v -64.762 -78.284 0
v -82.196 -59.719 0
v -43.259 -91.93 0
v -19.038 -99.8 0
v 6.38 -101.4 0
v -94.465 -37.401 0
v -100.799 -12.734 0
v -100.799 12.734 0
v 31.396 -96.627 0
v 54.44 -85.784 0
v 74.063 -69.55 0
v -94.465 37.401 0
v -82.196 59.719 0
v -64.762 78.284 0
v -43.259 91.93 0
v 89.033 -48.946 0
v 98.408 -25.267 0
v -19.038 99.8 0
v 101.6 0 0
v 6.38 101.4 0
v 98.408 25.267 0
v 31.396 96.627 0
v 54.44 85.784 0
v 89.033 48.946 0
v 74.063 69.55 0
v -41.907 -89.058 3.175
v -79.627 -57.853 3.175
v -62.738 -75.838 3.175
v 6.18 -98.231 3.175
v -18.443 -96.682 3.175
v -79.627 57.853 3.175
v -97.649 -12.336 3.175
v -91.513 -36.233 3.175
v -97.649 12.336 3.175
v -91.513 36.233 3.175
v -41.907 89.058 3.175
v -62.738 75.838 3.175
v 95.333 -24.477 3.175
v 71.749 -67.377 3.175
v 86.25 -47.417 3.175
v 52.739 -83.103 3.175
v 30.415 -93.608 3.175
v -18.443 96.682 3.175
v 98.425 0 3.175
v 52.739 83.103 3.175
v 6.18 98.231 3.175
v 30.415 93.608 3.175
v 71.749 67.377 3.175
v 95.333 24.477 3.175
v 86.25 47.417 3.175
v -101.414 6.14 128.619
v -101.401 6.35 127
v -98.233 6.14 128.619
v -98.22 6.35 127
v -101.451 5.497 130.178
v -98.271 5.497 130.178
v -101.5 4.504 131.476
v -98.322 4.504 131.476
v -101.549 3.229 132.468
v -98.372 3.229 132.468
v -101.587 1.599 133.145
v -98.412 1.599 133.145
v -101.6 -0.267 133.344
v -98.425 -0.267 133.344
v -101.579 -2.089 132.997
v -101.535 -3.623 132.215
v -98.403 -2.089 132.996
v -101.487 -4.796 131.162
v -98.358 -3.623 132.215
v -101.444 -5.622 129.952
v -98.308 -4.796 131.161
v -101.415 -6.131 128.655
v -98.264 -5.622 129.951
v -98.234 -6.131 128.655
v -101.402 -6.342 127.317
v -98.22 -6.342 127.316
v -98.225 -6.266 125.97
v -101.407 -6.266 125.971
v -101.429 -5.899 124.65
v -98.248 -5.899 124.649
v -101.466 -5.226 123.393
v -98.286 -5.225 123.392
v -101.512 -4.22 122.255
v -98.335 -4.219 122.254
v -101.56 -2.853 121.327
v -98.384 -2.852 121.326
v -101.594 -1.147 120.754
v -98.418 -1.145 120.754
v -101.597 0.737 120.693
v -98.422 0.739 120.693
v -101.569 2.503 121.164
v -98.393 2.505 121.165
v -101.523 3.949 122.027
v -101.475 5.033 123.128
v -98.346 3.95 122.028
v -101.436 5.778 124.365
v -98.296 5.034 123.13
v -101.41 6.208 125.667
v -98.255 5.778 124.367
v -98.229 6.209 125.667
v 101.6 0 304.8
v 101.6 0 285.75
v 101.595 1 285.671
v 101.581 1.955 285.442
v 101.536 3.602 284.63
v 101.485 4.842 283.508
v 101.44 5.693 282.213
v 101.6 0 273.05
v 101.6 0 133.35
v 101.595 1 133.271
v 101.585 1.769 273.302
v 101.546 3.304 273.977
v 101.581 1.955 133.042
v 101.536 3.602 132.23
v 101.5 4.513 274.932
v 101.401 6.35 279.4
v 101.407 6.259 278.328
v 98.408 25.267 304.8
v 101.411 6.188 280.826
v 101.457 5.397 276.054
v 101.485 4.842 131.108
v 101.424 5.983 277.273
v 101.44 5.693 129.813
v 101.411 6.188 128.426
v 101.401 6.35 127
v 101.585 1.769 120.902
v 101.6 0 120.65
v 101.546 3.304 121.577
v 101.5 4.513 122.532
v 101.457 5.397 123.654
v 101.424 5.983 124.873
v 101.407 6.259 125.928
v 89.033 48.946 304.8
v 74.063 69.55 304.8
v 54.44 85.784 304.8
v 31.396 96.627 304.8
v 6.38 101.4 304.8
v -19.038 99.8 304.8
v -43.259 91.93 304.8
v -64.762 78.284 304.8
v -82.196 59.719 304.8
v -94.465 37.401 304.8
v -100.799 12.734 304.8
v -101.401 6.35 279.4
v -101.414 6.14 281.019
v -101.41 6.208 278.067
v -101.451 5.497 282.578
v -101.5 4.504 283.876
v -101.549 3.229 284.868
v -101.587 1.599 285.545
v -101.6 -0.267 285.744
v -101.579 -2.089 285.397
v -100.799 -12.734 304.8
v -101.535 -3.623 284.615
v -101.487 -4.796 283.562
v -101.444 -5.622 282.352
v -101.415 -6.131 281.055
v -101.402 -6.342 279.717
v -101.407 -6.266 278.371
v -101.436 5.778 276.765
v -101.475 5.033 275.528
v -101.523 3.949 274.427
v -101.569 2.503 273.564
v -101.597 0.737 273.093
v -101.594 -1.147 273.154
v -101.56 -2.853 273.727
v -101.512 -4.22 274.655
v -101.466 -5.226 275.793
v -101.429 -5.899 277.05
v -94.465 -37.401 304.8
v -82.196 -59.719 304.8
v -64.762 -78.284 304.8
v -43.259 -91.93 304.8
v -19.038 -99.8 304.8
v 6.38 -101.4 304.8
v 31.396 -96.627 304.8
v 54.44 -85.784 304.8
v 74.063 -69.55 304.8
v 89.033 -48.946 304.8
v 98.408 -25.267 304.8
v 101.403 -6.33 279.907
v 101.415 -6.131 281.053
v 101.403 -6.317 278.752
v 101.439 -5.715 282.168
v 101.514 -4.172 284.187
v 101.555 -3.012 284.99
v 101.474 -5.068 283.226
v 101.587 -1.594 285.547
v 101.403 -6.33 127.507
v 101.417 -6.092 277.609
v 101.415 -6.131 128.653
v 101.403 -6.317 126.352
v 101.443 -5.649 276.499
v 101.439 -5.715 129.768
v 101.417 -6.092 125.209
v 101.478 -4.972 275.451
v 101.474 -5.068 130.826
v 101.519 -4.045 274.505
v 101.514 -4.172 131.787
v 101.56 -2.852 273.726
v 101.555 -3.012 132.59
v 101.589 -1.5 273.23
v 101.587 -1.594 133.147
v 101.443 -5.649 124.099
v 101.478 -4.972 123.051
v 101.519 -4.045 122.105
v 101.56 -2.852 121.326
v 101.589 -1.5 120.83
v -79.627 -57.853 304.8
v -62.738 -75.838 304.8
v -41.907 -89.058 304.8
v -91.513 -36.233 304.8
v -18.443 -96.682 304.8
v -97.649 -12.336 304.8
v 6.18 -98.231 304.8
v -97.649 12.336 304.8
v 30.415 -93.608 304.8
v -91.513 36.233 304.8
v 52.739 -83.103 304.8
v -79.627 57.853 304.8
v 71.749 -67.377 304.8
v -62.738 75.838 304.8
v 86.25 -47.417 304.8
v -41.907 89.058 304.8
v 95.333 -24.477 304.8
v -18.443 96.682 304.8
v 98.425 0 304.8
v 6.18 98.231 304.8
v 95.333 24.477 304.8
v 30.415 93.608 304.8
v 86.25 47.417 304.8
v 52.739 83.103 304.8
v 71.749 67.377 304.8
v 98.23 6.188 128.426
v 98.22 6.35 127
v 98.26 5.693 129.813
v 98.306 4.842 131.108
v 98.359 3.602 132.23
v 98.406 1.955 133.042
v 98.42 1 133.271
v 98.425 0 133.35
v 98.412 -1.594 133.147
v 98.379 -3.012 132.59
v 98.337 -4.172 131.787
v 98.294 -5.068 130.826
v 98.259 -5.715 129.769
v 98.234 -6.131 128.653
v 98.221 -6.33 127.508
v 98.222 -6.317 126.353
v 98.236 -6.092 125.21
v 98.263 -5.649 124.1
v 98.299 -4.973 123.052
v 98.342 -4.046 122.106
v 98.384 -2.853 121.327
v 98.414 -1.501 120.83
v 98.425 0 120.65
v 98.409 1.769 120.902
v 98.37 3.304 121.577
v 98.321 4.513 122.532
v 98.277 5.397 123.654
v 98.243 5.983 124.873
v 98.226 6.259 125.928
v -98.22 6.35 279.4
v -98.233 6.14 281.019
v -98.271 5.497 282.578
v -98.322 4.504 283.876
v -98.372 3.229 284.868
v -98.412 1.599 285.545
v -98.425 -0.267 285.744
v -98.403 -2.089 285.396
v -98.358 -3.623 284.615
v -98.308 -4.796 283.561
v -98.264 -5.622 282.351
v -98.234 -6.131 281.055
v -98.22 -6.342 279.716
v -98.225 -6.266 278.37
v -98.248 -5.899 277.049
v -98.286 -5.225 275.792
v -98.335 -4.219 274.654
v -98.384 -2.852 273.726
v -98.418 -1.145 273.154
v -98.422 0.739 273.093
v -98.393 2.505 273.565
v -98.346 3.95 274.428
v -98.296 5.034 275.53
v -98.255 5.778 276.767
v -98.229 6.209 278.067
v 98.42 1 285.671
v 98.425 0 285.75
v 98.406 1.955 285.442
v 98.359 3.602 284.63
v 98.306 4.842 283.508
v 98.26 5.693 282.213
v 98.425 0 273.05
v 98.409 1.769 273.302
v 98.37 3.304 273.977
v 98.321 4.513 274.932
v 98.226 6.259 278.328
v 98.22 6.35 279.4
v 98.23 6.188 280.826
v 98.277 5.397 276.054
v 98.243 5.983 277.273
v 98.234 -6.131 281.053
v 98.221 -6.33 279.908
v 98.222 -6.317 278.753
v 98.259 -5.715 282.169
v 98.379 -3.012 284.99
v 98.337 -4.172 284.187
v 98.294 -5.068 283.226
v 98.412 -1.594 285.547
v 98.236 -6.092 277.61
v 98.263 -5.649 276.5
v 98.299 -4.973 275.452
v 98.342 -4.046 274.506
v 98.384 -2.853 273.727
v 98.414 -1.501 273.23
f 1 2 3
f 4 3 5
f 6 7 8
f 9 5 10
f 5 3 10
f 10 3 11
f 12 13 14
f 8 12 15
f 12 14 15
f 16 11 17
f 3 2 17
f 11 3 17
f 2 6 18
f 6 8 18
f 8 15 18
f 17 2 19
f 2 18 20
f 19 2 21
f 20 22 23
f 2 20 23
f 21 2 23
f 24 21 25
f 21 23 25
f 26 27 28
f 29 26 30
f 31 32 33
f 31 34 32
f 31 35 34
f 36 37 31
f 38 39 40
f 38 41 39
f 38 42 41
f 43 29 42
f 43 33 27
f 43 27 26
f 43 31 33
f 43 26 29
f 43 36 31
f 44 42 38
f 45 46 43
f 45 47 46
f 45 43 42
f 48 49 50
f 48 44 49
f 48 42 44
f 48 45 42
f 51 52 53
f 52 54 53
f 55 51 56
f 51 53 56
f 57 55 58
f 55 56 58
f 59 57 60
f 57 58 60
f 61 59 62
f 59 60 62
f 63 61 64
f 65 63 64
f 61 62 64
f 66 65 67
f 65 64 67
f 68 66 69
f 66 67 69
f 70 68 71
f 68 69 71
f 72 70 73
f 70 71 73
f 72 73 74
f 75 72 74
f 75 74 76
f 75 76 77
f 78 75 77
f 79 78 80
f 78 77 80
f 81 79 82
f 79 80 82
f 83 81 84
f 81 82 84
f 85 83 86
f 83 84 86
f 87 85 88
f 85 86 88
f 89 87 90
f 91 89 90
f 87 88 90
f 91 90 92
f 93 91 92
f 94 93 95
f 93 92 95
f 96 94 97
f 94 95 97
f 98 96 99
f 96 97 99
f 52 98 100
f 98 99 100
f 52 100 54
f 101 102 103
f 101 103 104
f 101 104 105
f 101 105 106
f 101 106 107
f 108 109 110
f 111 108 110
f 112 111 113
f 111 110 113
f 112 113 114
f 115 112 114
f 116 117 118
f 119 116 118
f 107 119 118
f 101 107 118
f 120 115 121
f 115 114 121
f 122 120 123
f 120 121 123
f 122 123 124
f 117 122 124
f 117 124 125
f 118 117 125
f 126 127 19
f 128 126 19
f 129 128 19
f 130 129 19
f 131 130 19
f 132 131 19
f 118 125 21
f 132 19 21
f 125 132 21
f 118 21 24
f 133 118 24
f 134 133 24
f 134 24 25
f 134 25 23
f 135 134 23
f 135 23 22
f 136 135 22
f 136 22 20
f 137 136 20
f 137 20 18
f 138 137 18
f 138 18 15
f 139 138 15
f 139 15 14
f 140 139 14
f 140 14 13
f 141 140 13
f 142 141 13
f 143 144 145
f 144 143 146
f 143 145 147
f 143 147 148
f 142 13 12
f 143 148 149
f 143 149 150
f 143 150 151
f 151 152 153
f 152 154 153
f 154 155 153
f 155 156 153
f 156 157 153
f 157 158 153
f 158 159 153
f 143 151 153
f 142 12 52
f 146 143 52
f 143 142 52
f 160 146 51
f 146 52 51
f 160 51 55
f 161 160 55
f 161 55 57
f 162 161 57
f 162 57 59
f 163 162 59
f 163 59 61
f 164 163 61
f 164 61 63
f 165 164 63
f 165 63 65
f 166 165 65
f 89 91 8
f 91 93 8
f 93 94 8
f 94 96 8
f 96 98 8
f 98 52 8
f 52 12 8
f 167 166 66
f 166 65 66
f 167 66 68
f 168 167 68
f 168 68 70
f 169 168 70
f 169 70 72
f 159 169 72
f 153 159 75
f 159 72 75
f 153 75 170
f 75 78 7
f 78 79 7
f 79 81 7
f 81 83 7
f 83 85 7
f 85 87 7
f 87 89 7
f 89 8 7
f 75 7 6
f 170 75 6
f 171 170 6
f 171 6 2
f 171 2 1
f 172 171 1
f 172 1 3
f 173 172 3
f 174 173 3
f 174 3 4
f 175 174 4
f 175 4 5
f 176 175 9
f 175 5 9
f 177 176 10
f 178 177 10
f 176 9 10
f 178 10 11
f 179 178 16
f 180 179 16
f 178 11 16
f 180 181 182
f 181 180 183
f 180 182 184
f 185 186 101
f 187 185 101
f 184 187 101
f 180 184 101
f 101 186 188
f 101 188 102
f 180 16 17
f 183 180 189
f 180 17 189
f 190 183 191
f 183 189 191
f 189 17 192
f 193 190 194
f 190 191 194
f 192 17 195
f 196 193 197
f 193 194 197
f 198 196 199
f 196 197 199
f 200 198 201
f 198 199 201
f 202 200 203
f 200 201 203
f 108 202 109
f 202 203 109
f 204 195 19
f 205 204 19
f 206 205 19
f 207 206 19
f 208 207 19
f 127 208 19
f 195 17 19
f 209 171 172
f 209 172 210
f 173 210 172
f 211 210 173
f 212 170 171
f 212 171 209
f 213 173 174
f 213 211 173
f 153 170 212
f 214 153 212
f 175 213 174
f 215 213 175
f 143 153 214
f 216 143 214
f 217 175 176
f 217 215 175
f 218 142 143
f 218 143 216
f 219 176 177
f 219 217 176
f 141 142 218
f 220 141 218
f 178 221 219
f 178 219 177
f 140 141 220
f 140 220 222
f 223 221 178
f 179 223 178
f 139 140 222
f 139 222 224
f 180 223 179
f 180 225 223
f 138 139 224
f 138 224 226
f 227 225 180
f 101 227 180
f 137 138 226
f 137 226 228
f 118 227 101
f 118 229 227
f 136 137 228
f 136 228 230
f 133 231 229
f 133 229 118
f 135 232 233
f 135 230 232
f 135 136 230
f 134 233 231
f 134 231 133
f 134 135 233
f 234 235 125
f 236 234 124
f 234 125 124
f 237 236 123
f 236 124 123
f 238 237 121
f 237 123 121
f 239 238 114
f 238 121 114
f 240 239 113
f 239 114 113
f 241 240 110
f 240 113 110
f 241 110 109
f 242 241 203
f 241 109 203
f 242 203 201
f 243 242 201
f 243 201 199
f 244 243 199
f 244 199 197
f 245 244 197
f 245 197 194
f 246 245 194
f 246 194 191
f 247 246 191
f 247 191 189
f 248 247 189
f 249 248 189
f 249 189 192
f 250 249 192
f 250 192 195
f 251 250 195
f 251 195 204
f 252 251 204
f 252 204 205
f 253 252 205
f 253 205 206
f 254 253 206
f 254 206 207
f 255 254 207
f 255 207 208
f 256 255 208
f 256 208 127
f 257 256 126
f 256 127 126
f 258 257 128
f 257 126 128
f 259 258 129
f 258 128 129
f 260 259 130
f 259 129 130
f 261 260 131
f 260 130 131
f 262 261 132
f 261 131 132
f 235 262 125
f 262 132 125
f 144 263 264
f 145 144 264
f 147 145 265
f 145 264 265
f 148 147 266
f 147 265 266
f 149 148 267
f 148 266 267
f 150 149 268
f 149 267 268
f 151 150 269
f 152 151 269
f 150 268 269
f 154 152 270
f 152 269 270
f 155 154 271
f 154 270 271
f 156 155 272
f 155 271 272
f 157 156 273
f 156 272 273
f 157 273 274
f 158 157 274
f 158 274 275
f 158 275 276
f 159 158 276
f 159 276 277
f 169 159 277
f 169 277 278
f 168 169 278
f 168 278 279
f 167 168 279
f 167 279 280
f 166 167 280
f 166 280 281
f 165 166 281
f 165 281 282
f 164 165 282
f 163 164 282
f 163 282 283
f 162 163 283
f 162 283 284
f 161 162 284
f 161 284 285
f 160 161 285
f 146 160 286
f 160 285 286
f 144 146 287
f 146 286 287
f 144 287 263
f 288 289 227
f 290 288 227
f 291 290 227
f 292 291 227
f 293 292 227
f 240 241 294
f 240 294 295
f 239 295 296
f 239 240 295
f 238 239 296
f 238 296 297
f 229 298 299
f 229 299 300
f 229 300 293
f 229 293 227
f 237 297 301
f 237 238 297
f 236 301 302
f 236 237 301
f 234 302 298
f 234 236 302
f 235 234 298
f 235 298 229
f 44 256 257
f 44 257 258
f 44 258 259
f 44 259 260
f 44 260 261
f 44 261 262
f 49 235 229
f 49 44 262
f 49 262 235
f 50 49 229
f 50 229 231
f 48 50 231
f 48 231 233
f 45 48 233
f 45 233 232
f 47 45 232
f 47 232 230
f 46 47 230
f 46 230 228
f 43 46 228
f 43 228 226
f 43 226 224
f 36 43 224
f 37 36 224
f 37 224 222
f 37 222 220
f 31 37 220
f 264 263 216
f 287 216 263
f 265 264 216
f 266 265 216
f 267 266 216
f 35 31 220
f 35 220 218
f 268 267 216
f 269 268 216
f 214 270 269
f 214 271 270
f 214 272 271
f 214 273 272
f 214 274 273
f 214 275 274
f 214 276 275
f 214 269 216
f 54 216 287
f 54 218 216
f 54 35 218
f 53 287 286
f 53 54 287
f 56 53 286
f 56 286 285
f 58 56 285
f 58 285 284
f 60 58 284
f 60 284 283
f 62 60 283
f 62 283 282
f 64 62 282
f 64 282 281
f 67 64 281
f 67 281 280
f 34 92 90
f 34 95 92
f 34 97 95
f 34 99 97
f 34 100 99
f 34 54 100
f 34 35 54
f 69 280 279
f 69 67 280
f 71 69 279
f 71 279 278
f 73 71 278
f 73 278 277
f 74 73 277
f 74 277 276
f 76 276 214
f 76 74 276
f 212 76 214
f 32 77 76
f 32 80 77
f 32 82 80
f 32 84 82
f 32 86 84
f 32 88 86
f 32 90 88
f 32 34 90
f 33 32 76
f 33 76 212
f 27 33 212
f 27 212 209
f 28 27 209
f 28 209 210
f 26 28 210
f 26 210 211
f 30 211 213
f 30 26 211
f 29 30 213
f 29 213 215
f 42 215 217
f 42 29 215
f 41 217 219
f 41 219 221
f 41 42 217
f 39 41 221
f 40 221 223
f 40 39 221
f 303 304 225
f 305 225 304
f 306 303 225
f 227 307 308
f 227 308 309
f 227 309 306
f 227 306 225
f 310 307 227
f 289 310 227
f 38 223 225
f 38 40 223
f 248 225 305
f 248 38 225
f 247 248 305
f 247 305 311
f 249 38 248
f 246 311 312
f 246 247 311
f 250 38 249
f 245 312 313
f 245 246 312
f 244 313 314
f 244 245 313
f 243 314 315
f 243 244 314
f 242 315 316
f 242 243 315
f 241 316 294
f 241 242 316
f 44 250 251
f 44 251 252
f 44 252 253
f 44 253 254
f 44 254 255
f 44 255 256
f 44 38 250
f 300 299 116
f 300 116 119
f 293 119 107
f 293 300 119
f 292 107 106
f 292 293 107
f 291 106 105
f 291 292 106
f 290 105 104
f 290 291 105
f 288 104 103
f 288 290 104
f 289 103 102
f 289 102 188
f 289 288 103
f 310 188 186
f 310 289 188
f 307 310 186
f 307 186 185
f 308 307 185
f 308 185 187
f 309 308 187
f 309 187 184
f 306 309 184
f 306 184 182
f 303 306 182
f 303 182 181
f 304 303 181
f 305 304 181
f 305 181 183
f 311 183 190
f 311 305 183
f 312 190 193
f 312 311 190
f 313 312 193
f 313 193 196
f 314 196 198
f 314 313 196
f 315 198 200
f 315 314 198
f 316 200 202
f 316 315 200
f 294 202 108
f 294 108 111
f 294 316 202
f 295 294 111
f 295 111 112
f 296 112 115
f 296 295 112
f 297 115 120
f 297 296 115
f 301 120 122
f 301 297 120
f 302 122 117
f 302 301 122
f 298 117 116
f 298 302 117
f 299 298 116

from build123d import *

# Parameters (mm, degrees)
F0_R     = 101.6
F1_DEPTH = 304.8
F2_T     = -3.175
F3_R     = 6.35
F4_DEPTH = 279.4


with BuildPart() as f1:
    # F0 (on Top) → F1 (new body)
    with BuildSketch(Plane.XY):
        Circle(F0_R)
    extrude(amount=F1_DEPTH)

    # F2
    f2_openings = [f1.faces().sort_by_distance(p)[0] for p in [
        (0, 0, 304.8),
    ]]
    offset(amount=F2_T, openings=f2_openings)

    # F3 (on Right) → F4 (cut, symmetric)
    with BuildSketch(Plane.YZ):
        with Locations((0, 279.4)):
            Circle(F3_R)
        with Locations((0, 127)):
            Circle(F3_R)
    extrude(amount=F4_DEPTH, both=True, mode=Mode.SUBTRACT)


solid = f1.part
